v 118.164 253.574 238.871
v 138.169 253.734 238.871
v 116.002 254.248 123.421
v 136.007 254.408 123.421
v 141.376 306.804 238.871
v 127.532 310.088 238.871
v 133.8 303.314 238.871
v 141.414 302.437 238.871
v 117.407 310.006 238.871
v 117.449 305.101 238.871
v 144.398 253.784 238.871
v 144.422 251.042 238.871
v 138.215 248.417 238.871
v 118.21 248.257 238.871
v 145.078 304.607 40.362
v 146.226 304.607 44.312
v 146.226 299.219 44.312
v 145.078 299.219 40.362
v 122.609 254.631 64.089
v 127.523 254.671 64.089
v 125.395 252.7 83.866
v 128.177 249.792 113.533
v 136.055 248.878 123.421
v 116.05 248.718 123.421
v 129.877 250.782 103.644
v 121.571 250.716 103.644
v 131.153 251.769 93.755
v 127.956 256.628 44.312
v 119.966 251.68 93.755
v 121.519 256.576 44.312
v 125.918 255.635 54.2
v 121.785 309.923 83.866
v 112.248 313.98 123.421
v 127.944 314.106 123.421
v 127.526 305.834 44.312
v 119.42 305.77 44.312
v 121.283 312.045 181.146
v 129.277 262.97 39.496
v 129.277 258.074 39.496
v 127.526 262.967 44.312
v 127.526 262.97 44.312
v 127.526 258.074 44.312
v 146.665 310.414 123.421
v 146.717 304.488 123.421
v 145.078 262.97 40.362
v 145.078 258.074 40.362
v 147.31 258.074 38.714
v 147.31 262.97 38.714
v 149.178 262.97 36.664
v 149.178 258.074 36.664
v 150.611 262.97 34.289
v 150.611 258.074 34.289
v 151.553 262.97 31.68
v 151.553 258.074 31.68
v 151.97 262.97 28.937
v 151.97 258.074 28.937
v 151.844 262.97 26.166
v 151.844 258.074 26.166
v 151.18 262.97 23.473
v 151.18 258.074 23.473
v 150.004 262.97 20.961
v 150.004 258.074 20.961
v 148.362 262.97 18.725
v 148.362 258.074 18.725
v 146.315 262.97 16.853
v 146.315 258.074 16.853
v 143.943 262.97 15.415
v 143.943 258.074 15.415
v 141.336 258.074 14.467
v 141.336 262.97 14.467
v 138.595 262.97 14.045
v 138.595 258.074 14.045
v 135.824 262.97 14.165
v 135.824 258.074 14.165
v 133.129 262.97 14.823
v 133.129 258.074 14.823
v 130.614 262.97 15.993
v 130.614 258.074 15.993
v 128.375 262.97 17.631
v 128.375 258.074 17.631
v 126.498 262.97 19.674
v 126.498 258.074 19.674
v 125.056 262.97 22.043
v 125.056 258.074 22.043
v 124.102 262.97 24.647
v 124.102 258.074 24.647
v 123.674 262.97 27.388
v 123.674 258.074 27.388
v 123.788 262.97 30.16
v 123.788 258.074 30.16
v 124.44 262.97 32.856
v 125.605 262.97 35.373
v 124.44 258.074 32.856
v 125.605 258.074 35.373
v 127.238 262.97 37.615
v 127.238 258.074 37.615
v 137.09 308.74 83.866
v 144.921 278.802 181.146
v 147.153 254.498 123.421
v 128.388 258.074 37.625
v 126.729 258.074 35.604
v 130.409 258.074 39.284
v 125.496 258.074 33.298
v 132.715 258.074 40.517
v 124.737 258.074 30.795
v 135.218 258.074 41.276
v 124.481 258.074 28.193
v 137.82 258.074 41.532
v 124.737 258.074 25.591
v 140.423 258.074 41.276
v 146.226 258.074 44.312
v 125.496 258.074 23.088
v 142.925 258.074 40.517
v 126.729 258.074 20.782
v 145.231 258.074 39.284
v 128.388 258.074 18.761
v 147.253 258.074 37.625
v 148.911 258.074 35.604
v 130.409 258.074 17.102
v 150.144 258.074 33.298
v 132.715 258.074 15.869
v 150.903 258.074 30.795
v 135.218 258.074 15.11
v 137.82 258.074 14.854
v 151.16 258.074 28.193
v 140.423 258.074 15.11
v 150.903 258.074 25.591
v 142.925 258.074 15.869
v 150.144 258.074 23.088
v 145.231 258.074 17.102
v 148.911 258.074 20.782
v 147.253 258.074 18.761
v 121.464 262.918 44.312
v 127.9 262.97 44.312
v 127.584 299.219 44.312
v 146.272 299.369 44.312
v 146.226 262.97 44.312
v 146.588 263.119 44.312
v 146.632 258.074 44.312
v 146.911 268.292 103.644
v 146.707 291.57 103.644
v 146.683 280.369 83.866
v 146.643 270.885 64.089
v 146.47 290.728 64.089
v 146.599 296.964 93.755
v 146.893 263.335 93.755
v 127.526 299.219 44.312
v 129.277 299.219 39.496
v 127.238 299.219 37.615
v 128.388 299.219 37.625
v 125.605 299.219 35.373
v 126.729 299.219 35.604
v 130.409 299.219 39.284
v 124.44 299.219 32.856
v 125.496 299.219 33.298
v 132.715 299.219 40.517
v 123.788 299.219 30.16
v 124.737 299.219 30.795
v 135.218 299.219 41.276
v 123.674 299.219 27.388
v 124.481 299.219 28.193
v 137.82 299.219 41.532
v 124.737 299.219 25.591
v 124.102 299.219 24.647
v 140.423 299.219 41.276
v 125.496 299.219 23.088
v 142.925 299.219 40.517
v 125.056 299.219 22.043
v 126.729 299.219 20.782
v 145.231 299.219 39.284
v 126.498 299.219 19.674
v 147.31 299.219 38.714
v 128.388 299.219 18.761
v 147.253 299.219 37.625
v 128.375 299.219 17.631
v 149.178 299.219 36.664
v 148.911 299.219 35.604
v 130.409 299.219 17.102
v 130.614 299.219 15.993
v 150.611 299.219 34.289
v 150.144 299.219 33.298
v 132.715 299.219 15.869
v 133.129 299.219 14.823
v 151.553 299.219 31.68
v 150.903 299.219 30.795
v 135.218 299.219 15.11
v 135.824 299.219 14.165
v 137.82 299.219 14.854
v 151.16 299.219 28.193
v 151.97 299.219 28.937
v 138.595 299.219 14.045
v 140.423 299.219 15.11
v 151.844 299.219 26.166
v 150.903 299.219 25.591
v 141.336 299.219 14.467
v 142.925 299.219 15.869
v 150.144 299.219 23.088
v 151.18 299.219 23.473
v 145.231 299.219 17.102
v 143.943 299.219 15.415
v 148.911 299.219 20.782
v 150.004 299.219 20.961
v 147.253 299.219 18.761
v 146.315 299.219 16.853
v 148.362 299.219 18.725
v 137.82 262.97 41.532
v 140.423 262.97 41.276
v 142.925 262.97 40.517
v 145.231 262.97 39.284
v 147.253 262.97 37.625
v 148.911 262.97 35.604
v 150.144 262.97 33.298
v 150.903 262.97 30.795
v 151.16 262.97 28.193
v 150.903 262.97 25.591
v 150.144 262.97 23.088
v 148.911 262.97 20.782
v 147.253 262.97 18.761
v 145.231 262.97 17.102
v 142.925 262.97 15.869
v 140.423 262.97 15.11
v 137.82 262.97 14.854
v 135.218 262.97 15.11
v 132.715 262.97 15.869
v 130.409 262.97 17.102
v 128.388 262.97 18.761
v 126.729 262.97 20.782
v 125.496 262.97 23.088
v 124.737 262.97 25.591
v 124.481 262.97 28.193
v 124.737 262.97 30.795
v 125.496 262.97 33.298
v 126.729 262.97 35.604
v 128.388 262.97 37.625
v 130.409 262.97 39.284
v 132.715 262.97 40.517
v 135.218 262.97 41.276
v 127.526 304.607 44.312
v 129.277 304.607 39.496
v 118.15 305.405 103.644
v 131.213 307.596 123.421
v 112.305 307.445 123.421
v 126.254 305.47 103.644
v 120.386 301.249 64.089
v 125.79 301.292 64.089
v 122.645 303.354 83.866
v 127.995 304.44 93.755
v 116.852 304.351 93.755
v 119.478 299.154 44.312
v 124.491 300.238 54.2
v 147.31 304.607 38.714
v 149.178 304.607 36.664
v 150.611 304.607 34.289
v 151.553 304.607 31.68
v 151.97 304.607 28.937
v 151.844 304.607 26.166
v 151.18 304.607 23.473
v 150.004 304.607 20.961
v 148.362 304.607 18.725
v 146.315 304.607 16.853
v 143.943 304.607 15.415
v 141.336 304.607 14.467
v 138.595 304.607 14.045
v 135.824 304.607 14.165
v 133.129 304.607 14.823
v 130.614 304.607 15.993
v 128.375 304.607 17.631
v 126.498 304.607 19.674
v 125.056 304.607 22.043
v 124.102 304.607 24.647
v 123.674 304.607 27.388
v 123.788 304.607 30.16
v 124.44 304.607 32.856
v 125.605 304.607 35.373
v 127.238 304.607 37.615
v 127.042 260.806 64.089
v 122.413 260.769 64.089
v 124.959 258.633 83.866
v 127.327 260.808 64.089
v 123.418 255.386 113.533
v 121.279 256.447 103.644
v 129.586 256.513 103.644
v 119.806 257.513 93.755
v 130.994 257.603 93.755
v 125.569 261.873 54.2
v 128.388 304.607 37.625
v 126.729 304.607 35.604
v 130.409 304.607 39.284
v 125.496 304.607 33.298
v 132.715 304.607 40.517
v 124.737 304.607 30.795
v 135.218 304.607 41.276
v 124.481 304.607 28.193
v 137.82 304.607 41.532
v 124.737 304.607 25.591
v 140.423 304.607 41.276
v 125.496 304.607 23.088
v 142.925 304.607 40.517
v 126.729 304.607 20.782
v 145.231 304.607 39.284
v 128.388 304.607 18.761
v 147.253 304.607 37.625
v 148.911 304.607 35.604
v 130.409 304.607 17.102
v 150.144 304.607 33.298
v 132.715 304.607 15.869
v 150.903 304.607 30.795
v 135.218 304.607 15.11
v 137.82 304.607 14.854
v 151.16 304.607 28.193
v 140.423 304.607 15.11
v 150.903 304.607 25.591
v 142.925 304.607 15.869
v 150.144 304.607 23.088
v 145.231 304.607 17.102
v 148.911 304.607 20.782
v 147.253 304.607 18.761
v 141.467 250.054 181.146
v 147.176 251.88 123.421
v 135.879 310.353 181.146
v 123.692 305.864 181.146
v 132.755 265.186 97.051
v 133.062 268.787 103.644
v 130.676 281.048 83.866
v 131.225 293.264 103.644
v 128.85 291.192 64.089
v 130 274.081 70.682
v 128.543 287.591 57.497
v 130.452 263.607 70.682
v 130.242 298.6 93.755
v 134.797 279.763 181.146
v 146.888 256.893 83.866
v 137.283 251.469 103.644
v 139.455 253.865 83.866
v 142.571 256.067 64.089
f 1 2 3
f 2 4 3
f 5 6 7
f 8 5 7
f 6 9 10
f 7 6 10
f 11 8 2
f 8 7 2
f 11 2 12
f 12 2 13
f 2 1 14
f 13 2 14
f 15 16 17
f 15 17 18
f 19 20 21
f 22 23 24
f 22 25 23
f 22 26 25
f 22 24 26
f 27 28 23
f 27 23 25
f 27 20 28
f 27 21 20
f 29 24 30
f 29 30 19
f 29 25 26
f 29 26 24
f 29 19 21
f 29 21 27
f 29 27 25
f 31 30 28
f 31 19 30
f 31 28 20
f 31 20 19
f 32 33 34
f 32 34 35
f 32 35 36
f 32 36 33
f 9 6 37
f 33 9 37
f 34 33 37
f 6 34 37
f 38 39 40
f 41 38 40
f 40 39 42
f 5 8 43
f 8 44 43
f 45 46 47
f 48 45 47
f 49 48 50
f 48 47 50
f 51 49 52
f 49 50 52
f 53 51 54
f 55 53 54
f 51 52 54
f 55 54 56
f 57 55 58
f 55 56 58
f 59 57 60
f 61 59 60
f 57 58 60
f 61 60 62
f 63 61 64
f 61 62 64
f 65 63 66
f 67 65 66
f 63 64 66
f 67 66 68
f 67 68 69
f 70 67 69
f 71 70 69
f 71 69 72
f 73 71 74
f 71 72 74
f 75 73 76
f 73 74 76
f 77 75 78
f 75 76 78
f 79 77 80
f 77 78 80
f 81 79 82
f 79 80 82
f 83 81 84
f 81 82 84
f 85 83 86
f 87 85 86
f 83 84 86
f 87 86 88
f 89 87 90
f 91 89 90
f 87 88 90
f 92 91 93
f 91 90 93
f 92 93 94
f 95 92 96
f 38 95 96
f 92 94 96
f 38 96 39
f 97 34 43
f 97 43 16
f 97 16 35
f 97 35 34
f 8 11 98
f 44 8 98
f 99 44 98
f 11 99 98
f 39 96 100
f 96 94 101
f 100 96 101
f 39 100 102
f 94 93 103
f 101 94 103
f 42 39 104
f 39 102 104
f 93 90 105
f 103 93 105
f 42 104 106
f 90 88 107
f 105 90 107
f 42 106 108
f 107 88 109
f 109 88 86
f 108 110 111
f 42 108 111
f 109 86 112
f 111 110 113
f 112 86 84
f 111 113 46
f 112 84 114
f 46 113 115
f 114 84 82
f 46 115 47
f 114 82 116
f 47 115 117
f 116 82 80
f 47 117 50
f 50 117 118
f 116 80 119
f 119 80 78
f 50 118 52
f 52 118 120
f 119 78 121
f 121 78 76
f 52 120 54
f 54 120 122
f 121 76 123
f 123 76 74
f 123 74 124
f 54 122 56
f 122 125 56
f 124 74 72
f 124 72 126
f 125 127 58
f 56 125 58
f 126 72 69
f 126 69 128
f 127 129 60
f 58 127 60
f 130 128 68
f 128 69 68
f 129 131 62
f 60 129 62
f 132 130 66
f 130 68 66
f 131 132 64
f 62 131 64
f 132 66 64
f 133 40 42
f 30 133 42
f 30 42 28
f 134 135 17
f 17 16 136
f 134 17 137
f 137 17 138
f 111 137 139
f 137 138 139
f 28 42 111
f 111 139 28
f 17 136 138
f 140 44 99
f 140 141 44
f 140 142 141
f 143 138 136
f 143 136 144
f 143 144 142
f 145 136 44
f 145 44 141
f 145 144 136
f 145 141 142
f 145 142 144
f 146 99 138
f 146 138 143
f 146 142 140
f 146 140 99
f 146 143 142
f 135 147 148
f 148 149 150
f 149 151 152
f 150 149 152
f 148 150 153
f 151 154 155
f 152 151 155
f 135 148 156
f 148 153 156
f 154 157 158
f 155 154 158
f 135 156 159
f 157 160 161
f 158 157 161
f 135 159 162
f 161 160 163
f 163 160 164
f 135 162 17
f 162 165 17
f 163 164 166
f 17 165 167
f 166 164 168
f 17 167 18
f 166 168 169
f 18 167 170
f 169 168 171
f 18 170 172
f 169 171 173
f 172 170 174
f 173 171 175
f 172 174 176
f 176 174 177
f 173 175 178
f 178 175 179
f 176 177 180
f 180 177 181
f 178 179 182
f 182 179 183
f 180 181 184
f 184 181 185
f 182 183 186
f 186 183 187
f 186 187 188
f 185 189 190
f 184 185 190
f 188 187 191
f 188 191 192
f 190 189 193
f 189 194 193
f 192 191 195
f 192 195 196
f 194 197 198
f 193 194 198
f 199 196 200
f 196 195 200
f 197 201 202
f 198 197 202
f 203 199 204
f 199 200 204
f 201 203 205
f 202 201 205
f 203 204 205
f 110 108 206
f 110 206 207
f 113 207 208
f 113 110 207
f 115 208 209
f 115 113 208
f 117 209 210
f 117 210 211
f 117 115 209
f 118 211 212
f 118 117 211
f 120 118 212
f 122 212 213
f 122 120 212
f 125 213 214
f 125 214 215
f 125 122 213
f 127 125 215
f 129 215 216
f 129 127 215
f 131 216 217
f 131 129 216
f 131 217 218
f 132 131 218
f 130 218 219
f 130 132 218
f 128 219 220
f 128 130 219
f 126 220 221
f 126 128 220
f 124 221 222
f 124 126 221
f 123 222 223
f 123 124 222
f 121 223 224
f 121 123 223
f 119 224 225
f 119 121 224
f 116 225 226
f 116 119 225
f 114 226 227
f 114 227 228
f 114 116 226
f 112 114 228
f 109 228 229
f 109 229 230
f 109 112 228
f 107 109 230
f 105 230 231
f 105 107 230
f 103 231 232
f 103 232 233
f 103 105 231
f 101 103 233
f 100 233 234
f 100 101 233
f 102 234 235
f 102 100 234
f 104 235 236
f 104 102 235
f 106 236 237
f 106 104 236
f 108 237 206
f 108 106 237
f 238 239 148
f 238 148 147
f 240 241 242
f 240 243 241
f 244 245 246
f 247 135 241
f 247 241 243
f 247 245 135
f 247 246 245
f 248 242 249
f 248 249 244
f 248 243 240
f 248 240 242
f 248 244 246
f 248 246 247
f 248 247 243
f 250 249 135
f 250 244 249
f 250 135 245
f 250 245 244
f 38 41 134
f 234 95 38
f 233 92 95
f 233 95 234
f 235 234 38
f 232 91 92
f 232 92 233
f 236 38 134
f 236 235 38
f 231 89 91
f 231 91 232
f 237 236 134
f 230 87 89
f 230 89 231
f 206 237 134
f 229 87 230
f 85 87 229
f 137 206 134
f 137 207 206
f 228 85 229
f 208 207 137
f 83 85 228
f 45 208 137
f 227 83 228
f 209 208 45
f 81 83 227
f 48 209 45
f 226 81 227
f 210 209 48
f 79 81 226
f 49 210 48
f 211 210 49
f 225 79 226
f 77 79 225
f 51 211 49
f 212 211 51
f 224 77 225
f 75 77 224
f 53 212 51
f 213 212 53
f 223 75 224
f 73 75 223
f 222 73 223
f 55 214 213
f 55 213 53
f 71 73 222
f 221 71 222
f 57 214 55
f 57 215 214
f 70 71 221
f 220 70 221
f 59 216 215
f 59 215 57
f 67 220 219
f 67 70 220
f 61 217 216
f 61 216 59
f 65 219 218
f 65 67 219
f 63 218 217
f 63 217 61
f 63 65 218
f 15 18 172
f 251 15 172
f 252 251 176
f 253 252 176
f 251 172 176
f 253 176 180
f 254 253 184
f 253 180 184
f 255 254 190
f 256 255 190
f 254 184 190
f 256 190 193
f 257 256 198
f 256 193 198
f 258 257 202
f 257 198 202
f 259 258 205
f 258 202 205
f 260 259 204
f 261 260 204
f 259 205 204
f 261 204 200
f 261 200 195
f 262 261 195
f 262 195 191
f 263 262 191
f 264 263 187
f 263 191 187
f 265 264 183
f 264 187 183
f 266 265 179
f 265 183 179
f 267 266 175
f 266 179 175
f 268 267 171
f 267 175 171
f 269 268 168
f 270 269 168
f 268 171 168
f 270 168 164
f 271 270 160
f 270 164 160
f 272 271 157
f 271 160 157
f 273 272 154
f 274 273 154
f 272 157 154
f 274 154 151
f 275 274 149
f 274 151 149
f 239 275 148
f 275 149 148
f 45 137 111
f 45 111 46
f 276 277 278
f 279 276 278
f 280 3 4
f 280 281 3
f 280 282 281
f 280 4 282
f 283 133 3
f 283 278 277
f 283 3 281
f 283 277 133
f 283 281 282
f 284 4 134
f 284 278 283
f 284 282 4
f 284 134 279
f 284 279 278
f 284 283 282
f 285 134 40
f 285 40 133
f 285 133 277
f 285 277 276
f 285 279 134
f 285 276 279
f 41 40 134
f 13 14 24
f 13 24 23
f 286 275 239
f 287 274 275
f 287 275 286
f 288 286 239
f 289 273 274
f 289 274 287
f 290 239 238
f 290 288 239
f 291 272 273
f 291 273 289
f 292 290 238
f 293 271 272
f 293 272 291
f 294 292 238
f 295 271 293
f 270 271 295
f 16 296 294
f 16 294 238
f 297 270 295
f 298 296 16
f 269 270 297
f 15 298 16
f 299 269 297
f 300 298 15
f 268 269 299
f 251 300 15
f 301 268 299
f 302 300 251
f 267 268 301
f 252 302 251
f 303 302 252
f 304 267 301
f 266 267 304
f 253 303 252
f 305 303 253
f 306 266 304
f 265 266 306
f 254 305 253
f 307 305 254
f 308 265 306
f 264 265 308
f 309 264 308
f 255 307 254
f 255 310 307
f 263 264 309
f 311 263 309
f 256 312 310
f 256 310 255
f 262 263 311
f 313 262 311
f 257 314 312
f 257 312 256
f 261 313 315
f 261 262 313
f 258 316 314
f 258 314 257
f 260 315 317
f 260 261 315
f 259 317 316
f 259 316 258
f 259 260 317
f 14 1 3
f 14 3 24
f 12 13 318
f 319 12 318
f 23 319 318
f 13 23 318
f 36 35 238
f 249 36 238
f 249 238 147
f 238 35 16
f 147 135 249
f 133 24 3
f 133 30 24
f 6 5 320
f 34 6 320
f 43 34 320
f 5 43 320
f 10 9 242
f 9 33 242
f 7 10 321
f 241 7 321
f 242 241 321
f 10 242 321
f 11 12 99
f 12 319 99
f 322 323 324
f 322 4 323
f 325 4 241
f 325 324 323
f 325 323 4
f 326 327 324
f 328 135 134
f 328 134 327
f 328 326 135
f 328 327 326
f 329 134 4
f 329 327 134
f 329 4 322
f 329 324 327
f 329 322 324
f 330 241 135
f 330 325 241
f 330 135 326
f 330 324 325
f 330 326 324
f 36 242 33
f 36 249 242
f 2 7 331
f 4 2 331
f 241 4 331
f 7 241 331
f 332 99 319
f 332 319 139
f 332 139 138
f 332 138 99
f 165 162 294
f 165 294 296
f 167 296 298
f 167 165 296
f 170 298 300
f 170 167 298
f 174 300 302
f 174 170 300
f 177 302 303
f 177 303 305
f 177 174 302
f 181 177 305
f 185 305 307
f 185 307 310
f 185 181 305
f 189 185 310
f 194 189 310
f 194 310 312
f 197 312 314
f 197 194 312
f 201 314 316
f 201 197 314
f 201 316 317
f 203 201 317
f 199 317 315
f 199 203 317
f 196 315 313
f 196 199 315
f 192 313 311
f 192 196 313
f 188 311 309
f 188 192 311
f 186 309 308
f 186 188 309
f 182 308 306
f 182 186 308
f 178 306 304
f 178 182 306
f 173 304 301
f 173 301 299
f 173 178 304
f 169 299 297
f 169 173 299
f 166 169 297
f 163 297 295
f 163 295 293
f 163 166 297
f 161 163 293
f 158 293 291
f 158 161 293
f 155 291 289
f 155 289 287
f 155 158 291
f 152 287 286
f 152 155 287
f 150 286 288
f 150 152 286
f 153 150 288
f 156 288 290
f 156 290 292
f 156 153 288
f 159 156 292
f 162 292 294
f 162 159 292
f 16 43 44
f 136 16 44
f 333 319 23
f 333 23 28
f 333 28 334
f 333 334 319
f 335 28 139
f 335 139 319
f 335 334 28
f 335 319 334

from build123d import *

# Parameters (mm, degrees)
SKETCH4_R           = 13.33935295
BOSS_EXTRUDE1_DEPTH = 5.387848
BOSS_EXTRUDE2_START = -41.145202
SKETCH4_2_R         = 13.33935295
BOSS_EXTRUDE2_DEPTH = 4.89559


with BuildPart() as part:
    # Sketch1 → Loft1 section 0
    with BuildSketch(Plane.XY.offset(238.871252)):
        with BuildLine():
            Line((117.449346, 305.101244), (133.79958, 303.314354))
            Line((133.79958, 303.314354), (138.168888, 253.734316))
            Line((138.168888, 253.734316), (118.163594, 253.574042))
            Line((118.163594, 253.574042), (118.210076, 248.25706))
            Line((118.210076, 248.25706), (138.215116, 248.41708))
            Line((138.215116, 248.41708), (144.422368, 251.041916))
            Line((144.422368, 251.041916), (144.398492, 253.7841))
            Line((144.398492, 253.7841), (141.414246, 302.436784))
            Line((141.414246, 302.436784), (141.376146, 306.803552))
            Line((141.376146, 306.803552), (127.531876, 310.087518))
            Line((127.531876, 310.087518), (117.406674, 310.006492))
            Line((117.406674, 310.006492), (117.449346, 305.101244))
        make_face()
    # Sketch2 → Loft1 section 1
    with BuildSketch(Plane.XY.offset(123.421394)):
        with BuildLine():
            Line((112.248188, 313.980322), (127.943864, 314.106052))
            Line((127.943864, 314.106052), (146.665442, 310.414162))
            Line((146.665442, 310.414162), (146.717258, 304.488342))
            Line((146.717258, 304.488342), (147.153376, 254.497586))
            Line((147.153376, 254.497586), (147.176236, 251.879608))
            Line((147.176236, 251.879608), (136.055354, 248.87809))
            Line((136.055354, 248.87809), (116.05006, 248.717816))
            Line((116.05006, 248.717816), (116.002054, 254.247904))
            Line((116.002054, 254.247904), (136.007094, 254.408178))
            Line((136.007094, 254.408178), (131.213352, 307.596286))
            Line((131.213352, 307.596286), (112.305084, 307.444902))
            Line((112.305084, 307.444902), (112.248188, 313.980322))
        make_face()
    loft()

    # Sketch2<3> → Loft2 section 0
    with BuildSketch(Plane.XY.offset(123.421394)):
        with BuildLine():
            Line((112.248188, 313.980322), (127.943864, 314.106052))
            Line((127.943864, 314.106052), (146.665442, 310.414162))
            Line((146.665442, 310.414162), (146.717258, 304.488342))
            Line((146.717258, 304.488342), (147.153376, 254.497586))
            Line((147.153376, 254.497586), (147.176236, 251.879608))
            Line((147.176236, 251.879608), (136.055354, 248.87809))
            Line((136.055354, 248.87809), (116.05006, 248.717816))
            Line((116.05006, 248.717816), (116.002054, 254.247904))
            Line((116.002054, 254.247904), (136.007094, 254.408178))
            Line((136.007094, 254.408178), (131.213352, 307.596286))
            Line((131.213352, 307.596286), (112.305084, 307.444902))
            Line((112.305084, 307.444902), (112.248188, 313.980322))
        make_face()
    # Sketch3 → Loft2 section 1
    with BuildSketch(Plane.XY.offset(44.31157)):
        with BuildLine():
            Line((119.47779, 299.154342), (119.419878, 305.769518))
            Line((119.419878, 305.769518), (127.526288, 305.834288))
            Line((127.526288, 305.834288), (146.226276, 304.60696))
            Line((146.226276, 304.60696), (146.271996, 299.368972))
            Line((146.271996, 299.368972), (146.588226, 263.119108))
            Line((146.588226, 263.119108), (146.632168, 258.073906))
            Line((146.632168, 258.073906), (127.955548, 256.62763))
            Line((127.955548, 256.62763), (121.519188, 256.576068))
            Line((121.519188, 256.576068), (121.463816, 262.91794))
            Line((121.463816, 262.91794), (127.900176, 262.969502))
            Line((127.900176, 262.969502), (127.583946, 299.219112))
            Line((127.583946, 299.219112), (119.47779, 299.154342))
        make_face()
    loft()

    # Sketch4 → Boss-Extrude1 (add)
    with BuildSketch(Plane(origin=(0, 299.219112, 0), x_dir=(1, 0, 0), z_dir=(0, 1, 0))):
        with BuildLine():
            Line((146.226276, -44.31157), (145.07845, -40.361616))
            ThreePointArc((145.07845, -40.361616), (138.59477889, -14.045079031), (129.276856, -39.496492))
            Line((129.276856, -39.496492), (127.526288, -44.31157))
            Line((127.526288, -44.31157), (146.226276, -44.31157))
        make_face()
        with Locations(Location((137.820198563, -28.192881954, 0), (0, 0, 270))):
            Circle(SKETCH4_R, mode=Mode.SUBTRACT)
    extrude(amount=BOSS_EXTRUDE1_DEPTH)

    # Sketch4<2> → Boss-Extrude2 (add)
    with BuildSketch(Plane(origin=(0, 299.219112, 0), x_dir=(1, 0, 0), z_dir=(0, 1, 0)).offset(BOSS_EXTRUDE2_START)):
        with BuildLine():
            Line((146.226276, -44.31157), (145.07845, -40.361616))
            ThreePointArc((145.07845, -40.361616), (138.59477889, -14.045079031), (129.276856, -39.496492))
            Line((129.276856, -39.496492), (127.526288, -44.31157))
            Line((127.526288, -44.31157), (146.226276, -44.31157))
        make_face()
        with Locations(Location((137.820198563, -28.192881954, 0), (0, 0, 270))):
            Circle(SKETCH4_2_R, mode=Mode.SUBTRACT)
    extrude(amount=BOSS_EXTRUDE2_DEPTH)


solid = part.part
